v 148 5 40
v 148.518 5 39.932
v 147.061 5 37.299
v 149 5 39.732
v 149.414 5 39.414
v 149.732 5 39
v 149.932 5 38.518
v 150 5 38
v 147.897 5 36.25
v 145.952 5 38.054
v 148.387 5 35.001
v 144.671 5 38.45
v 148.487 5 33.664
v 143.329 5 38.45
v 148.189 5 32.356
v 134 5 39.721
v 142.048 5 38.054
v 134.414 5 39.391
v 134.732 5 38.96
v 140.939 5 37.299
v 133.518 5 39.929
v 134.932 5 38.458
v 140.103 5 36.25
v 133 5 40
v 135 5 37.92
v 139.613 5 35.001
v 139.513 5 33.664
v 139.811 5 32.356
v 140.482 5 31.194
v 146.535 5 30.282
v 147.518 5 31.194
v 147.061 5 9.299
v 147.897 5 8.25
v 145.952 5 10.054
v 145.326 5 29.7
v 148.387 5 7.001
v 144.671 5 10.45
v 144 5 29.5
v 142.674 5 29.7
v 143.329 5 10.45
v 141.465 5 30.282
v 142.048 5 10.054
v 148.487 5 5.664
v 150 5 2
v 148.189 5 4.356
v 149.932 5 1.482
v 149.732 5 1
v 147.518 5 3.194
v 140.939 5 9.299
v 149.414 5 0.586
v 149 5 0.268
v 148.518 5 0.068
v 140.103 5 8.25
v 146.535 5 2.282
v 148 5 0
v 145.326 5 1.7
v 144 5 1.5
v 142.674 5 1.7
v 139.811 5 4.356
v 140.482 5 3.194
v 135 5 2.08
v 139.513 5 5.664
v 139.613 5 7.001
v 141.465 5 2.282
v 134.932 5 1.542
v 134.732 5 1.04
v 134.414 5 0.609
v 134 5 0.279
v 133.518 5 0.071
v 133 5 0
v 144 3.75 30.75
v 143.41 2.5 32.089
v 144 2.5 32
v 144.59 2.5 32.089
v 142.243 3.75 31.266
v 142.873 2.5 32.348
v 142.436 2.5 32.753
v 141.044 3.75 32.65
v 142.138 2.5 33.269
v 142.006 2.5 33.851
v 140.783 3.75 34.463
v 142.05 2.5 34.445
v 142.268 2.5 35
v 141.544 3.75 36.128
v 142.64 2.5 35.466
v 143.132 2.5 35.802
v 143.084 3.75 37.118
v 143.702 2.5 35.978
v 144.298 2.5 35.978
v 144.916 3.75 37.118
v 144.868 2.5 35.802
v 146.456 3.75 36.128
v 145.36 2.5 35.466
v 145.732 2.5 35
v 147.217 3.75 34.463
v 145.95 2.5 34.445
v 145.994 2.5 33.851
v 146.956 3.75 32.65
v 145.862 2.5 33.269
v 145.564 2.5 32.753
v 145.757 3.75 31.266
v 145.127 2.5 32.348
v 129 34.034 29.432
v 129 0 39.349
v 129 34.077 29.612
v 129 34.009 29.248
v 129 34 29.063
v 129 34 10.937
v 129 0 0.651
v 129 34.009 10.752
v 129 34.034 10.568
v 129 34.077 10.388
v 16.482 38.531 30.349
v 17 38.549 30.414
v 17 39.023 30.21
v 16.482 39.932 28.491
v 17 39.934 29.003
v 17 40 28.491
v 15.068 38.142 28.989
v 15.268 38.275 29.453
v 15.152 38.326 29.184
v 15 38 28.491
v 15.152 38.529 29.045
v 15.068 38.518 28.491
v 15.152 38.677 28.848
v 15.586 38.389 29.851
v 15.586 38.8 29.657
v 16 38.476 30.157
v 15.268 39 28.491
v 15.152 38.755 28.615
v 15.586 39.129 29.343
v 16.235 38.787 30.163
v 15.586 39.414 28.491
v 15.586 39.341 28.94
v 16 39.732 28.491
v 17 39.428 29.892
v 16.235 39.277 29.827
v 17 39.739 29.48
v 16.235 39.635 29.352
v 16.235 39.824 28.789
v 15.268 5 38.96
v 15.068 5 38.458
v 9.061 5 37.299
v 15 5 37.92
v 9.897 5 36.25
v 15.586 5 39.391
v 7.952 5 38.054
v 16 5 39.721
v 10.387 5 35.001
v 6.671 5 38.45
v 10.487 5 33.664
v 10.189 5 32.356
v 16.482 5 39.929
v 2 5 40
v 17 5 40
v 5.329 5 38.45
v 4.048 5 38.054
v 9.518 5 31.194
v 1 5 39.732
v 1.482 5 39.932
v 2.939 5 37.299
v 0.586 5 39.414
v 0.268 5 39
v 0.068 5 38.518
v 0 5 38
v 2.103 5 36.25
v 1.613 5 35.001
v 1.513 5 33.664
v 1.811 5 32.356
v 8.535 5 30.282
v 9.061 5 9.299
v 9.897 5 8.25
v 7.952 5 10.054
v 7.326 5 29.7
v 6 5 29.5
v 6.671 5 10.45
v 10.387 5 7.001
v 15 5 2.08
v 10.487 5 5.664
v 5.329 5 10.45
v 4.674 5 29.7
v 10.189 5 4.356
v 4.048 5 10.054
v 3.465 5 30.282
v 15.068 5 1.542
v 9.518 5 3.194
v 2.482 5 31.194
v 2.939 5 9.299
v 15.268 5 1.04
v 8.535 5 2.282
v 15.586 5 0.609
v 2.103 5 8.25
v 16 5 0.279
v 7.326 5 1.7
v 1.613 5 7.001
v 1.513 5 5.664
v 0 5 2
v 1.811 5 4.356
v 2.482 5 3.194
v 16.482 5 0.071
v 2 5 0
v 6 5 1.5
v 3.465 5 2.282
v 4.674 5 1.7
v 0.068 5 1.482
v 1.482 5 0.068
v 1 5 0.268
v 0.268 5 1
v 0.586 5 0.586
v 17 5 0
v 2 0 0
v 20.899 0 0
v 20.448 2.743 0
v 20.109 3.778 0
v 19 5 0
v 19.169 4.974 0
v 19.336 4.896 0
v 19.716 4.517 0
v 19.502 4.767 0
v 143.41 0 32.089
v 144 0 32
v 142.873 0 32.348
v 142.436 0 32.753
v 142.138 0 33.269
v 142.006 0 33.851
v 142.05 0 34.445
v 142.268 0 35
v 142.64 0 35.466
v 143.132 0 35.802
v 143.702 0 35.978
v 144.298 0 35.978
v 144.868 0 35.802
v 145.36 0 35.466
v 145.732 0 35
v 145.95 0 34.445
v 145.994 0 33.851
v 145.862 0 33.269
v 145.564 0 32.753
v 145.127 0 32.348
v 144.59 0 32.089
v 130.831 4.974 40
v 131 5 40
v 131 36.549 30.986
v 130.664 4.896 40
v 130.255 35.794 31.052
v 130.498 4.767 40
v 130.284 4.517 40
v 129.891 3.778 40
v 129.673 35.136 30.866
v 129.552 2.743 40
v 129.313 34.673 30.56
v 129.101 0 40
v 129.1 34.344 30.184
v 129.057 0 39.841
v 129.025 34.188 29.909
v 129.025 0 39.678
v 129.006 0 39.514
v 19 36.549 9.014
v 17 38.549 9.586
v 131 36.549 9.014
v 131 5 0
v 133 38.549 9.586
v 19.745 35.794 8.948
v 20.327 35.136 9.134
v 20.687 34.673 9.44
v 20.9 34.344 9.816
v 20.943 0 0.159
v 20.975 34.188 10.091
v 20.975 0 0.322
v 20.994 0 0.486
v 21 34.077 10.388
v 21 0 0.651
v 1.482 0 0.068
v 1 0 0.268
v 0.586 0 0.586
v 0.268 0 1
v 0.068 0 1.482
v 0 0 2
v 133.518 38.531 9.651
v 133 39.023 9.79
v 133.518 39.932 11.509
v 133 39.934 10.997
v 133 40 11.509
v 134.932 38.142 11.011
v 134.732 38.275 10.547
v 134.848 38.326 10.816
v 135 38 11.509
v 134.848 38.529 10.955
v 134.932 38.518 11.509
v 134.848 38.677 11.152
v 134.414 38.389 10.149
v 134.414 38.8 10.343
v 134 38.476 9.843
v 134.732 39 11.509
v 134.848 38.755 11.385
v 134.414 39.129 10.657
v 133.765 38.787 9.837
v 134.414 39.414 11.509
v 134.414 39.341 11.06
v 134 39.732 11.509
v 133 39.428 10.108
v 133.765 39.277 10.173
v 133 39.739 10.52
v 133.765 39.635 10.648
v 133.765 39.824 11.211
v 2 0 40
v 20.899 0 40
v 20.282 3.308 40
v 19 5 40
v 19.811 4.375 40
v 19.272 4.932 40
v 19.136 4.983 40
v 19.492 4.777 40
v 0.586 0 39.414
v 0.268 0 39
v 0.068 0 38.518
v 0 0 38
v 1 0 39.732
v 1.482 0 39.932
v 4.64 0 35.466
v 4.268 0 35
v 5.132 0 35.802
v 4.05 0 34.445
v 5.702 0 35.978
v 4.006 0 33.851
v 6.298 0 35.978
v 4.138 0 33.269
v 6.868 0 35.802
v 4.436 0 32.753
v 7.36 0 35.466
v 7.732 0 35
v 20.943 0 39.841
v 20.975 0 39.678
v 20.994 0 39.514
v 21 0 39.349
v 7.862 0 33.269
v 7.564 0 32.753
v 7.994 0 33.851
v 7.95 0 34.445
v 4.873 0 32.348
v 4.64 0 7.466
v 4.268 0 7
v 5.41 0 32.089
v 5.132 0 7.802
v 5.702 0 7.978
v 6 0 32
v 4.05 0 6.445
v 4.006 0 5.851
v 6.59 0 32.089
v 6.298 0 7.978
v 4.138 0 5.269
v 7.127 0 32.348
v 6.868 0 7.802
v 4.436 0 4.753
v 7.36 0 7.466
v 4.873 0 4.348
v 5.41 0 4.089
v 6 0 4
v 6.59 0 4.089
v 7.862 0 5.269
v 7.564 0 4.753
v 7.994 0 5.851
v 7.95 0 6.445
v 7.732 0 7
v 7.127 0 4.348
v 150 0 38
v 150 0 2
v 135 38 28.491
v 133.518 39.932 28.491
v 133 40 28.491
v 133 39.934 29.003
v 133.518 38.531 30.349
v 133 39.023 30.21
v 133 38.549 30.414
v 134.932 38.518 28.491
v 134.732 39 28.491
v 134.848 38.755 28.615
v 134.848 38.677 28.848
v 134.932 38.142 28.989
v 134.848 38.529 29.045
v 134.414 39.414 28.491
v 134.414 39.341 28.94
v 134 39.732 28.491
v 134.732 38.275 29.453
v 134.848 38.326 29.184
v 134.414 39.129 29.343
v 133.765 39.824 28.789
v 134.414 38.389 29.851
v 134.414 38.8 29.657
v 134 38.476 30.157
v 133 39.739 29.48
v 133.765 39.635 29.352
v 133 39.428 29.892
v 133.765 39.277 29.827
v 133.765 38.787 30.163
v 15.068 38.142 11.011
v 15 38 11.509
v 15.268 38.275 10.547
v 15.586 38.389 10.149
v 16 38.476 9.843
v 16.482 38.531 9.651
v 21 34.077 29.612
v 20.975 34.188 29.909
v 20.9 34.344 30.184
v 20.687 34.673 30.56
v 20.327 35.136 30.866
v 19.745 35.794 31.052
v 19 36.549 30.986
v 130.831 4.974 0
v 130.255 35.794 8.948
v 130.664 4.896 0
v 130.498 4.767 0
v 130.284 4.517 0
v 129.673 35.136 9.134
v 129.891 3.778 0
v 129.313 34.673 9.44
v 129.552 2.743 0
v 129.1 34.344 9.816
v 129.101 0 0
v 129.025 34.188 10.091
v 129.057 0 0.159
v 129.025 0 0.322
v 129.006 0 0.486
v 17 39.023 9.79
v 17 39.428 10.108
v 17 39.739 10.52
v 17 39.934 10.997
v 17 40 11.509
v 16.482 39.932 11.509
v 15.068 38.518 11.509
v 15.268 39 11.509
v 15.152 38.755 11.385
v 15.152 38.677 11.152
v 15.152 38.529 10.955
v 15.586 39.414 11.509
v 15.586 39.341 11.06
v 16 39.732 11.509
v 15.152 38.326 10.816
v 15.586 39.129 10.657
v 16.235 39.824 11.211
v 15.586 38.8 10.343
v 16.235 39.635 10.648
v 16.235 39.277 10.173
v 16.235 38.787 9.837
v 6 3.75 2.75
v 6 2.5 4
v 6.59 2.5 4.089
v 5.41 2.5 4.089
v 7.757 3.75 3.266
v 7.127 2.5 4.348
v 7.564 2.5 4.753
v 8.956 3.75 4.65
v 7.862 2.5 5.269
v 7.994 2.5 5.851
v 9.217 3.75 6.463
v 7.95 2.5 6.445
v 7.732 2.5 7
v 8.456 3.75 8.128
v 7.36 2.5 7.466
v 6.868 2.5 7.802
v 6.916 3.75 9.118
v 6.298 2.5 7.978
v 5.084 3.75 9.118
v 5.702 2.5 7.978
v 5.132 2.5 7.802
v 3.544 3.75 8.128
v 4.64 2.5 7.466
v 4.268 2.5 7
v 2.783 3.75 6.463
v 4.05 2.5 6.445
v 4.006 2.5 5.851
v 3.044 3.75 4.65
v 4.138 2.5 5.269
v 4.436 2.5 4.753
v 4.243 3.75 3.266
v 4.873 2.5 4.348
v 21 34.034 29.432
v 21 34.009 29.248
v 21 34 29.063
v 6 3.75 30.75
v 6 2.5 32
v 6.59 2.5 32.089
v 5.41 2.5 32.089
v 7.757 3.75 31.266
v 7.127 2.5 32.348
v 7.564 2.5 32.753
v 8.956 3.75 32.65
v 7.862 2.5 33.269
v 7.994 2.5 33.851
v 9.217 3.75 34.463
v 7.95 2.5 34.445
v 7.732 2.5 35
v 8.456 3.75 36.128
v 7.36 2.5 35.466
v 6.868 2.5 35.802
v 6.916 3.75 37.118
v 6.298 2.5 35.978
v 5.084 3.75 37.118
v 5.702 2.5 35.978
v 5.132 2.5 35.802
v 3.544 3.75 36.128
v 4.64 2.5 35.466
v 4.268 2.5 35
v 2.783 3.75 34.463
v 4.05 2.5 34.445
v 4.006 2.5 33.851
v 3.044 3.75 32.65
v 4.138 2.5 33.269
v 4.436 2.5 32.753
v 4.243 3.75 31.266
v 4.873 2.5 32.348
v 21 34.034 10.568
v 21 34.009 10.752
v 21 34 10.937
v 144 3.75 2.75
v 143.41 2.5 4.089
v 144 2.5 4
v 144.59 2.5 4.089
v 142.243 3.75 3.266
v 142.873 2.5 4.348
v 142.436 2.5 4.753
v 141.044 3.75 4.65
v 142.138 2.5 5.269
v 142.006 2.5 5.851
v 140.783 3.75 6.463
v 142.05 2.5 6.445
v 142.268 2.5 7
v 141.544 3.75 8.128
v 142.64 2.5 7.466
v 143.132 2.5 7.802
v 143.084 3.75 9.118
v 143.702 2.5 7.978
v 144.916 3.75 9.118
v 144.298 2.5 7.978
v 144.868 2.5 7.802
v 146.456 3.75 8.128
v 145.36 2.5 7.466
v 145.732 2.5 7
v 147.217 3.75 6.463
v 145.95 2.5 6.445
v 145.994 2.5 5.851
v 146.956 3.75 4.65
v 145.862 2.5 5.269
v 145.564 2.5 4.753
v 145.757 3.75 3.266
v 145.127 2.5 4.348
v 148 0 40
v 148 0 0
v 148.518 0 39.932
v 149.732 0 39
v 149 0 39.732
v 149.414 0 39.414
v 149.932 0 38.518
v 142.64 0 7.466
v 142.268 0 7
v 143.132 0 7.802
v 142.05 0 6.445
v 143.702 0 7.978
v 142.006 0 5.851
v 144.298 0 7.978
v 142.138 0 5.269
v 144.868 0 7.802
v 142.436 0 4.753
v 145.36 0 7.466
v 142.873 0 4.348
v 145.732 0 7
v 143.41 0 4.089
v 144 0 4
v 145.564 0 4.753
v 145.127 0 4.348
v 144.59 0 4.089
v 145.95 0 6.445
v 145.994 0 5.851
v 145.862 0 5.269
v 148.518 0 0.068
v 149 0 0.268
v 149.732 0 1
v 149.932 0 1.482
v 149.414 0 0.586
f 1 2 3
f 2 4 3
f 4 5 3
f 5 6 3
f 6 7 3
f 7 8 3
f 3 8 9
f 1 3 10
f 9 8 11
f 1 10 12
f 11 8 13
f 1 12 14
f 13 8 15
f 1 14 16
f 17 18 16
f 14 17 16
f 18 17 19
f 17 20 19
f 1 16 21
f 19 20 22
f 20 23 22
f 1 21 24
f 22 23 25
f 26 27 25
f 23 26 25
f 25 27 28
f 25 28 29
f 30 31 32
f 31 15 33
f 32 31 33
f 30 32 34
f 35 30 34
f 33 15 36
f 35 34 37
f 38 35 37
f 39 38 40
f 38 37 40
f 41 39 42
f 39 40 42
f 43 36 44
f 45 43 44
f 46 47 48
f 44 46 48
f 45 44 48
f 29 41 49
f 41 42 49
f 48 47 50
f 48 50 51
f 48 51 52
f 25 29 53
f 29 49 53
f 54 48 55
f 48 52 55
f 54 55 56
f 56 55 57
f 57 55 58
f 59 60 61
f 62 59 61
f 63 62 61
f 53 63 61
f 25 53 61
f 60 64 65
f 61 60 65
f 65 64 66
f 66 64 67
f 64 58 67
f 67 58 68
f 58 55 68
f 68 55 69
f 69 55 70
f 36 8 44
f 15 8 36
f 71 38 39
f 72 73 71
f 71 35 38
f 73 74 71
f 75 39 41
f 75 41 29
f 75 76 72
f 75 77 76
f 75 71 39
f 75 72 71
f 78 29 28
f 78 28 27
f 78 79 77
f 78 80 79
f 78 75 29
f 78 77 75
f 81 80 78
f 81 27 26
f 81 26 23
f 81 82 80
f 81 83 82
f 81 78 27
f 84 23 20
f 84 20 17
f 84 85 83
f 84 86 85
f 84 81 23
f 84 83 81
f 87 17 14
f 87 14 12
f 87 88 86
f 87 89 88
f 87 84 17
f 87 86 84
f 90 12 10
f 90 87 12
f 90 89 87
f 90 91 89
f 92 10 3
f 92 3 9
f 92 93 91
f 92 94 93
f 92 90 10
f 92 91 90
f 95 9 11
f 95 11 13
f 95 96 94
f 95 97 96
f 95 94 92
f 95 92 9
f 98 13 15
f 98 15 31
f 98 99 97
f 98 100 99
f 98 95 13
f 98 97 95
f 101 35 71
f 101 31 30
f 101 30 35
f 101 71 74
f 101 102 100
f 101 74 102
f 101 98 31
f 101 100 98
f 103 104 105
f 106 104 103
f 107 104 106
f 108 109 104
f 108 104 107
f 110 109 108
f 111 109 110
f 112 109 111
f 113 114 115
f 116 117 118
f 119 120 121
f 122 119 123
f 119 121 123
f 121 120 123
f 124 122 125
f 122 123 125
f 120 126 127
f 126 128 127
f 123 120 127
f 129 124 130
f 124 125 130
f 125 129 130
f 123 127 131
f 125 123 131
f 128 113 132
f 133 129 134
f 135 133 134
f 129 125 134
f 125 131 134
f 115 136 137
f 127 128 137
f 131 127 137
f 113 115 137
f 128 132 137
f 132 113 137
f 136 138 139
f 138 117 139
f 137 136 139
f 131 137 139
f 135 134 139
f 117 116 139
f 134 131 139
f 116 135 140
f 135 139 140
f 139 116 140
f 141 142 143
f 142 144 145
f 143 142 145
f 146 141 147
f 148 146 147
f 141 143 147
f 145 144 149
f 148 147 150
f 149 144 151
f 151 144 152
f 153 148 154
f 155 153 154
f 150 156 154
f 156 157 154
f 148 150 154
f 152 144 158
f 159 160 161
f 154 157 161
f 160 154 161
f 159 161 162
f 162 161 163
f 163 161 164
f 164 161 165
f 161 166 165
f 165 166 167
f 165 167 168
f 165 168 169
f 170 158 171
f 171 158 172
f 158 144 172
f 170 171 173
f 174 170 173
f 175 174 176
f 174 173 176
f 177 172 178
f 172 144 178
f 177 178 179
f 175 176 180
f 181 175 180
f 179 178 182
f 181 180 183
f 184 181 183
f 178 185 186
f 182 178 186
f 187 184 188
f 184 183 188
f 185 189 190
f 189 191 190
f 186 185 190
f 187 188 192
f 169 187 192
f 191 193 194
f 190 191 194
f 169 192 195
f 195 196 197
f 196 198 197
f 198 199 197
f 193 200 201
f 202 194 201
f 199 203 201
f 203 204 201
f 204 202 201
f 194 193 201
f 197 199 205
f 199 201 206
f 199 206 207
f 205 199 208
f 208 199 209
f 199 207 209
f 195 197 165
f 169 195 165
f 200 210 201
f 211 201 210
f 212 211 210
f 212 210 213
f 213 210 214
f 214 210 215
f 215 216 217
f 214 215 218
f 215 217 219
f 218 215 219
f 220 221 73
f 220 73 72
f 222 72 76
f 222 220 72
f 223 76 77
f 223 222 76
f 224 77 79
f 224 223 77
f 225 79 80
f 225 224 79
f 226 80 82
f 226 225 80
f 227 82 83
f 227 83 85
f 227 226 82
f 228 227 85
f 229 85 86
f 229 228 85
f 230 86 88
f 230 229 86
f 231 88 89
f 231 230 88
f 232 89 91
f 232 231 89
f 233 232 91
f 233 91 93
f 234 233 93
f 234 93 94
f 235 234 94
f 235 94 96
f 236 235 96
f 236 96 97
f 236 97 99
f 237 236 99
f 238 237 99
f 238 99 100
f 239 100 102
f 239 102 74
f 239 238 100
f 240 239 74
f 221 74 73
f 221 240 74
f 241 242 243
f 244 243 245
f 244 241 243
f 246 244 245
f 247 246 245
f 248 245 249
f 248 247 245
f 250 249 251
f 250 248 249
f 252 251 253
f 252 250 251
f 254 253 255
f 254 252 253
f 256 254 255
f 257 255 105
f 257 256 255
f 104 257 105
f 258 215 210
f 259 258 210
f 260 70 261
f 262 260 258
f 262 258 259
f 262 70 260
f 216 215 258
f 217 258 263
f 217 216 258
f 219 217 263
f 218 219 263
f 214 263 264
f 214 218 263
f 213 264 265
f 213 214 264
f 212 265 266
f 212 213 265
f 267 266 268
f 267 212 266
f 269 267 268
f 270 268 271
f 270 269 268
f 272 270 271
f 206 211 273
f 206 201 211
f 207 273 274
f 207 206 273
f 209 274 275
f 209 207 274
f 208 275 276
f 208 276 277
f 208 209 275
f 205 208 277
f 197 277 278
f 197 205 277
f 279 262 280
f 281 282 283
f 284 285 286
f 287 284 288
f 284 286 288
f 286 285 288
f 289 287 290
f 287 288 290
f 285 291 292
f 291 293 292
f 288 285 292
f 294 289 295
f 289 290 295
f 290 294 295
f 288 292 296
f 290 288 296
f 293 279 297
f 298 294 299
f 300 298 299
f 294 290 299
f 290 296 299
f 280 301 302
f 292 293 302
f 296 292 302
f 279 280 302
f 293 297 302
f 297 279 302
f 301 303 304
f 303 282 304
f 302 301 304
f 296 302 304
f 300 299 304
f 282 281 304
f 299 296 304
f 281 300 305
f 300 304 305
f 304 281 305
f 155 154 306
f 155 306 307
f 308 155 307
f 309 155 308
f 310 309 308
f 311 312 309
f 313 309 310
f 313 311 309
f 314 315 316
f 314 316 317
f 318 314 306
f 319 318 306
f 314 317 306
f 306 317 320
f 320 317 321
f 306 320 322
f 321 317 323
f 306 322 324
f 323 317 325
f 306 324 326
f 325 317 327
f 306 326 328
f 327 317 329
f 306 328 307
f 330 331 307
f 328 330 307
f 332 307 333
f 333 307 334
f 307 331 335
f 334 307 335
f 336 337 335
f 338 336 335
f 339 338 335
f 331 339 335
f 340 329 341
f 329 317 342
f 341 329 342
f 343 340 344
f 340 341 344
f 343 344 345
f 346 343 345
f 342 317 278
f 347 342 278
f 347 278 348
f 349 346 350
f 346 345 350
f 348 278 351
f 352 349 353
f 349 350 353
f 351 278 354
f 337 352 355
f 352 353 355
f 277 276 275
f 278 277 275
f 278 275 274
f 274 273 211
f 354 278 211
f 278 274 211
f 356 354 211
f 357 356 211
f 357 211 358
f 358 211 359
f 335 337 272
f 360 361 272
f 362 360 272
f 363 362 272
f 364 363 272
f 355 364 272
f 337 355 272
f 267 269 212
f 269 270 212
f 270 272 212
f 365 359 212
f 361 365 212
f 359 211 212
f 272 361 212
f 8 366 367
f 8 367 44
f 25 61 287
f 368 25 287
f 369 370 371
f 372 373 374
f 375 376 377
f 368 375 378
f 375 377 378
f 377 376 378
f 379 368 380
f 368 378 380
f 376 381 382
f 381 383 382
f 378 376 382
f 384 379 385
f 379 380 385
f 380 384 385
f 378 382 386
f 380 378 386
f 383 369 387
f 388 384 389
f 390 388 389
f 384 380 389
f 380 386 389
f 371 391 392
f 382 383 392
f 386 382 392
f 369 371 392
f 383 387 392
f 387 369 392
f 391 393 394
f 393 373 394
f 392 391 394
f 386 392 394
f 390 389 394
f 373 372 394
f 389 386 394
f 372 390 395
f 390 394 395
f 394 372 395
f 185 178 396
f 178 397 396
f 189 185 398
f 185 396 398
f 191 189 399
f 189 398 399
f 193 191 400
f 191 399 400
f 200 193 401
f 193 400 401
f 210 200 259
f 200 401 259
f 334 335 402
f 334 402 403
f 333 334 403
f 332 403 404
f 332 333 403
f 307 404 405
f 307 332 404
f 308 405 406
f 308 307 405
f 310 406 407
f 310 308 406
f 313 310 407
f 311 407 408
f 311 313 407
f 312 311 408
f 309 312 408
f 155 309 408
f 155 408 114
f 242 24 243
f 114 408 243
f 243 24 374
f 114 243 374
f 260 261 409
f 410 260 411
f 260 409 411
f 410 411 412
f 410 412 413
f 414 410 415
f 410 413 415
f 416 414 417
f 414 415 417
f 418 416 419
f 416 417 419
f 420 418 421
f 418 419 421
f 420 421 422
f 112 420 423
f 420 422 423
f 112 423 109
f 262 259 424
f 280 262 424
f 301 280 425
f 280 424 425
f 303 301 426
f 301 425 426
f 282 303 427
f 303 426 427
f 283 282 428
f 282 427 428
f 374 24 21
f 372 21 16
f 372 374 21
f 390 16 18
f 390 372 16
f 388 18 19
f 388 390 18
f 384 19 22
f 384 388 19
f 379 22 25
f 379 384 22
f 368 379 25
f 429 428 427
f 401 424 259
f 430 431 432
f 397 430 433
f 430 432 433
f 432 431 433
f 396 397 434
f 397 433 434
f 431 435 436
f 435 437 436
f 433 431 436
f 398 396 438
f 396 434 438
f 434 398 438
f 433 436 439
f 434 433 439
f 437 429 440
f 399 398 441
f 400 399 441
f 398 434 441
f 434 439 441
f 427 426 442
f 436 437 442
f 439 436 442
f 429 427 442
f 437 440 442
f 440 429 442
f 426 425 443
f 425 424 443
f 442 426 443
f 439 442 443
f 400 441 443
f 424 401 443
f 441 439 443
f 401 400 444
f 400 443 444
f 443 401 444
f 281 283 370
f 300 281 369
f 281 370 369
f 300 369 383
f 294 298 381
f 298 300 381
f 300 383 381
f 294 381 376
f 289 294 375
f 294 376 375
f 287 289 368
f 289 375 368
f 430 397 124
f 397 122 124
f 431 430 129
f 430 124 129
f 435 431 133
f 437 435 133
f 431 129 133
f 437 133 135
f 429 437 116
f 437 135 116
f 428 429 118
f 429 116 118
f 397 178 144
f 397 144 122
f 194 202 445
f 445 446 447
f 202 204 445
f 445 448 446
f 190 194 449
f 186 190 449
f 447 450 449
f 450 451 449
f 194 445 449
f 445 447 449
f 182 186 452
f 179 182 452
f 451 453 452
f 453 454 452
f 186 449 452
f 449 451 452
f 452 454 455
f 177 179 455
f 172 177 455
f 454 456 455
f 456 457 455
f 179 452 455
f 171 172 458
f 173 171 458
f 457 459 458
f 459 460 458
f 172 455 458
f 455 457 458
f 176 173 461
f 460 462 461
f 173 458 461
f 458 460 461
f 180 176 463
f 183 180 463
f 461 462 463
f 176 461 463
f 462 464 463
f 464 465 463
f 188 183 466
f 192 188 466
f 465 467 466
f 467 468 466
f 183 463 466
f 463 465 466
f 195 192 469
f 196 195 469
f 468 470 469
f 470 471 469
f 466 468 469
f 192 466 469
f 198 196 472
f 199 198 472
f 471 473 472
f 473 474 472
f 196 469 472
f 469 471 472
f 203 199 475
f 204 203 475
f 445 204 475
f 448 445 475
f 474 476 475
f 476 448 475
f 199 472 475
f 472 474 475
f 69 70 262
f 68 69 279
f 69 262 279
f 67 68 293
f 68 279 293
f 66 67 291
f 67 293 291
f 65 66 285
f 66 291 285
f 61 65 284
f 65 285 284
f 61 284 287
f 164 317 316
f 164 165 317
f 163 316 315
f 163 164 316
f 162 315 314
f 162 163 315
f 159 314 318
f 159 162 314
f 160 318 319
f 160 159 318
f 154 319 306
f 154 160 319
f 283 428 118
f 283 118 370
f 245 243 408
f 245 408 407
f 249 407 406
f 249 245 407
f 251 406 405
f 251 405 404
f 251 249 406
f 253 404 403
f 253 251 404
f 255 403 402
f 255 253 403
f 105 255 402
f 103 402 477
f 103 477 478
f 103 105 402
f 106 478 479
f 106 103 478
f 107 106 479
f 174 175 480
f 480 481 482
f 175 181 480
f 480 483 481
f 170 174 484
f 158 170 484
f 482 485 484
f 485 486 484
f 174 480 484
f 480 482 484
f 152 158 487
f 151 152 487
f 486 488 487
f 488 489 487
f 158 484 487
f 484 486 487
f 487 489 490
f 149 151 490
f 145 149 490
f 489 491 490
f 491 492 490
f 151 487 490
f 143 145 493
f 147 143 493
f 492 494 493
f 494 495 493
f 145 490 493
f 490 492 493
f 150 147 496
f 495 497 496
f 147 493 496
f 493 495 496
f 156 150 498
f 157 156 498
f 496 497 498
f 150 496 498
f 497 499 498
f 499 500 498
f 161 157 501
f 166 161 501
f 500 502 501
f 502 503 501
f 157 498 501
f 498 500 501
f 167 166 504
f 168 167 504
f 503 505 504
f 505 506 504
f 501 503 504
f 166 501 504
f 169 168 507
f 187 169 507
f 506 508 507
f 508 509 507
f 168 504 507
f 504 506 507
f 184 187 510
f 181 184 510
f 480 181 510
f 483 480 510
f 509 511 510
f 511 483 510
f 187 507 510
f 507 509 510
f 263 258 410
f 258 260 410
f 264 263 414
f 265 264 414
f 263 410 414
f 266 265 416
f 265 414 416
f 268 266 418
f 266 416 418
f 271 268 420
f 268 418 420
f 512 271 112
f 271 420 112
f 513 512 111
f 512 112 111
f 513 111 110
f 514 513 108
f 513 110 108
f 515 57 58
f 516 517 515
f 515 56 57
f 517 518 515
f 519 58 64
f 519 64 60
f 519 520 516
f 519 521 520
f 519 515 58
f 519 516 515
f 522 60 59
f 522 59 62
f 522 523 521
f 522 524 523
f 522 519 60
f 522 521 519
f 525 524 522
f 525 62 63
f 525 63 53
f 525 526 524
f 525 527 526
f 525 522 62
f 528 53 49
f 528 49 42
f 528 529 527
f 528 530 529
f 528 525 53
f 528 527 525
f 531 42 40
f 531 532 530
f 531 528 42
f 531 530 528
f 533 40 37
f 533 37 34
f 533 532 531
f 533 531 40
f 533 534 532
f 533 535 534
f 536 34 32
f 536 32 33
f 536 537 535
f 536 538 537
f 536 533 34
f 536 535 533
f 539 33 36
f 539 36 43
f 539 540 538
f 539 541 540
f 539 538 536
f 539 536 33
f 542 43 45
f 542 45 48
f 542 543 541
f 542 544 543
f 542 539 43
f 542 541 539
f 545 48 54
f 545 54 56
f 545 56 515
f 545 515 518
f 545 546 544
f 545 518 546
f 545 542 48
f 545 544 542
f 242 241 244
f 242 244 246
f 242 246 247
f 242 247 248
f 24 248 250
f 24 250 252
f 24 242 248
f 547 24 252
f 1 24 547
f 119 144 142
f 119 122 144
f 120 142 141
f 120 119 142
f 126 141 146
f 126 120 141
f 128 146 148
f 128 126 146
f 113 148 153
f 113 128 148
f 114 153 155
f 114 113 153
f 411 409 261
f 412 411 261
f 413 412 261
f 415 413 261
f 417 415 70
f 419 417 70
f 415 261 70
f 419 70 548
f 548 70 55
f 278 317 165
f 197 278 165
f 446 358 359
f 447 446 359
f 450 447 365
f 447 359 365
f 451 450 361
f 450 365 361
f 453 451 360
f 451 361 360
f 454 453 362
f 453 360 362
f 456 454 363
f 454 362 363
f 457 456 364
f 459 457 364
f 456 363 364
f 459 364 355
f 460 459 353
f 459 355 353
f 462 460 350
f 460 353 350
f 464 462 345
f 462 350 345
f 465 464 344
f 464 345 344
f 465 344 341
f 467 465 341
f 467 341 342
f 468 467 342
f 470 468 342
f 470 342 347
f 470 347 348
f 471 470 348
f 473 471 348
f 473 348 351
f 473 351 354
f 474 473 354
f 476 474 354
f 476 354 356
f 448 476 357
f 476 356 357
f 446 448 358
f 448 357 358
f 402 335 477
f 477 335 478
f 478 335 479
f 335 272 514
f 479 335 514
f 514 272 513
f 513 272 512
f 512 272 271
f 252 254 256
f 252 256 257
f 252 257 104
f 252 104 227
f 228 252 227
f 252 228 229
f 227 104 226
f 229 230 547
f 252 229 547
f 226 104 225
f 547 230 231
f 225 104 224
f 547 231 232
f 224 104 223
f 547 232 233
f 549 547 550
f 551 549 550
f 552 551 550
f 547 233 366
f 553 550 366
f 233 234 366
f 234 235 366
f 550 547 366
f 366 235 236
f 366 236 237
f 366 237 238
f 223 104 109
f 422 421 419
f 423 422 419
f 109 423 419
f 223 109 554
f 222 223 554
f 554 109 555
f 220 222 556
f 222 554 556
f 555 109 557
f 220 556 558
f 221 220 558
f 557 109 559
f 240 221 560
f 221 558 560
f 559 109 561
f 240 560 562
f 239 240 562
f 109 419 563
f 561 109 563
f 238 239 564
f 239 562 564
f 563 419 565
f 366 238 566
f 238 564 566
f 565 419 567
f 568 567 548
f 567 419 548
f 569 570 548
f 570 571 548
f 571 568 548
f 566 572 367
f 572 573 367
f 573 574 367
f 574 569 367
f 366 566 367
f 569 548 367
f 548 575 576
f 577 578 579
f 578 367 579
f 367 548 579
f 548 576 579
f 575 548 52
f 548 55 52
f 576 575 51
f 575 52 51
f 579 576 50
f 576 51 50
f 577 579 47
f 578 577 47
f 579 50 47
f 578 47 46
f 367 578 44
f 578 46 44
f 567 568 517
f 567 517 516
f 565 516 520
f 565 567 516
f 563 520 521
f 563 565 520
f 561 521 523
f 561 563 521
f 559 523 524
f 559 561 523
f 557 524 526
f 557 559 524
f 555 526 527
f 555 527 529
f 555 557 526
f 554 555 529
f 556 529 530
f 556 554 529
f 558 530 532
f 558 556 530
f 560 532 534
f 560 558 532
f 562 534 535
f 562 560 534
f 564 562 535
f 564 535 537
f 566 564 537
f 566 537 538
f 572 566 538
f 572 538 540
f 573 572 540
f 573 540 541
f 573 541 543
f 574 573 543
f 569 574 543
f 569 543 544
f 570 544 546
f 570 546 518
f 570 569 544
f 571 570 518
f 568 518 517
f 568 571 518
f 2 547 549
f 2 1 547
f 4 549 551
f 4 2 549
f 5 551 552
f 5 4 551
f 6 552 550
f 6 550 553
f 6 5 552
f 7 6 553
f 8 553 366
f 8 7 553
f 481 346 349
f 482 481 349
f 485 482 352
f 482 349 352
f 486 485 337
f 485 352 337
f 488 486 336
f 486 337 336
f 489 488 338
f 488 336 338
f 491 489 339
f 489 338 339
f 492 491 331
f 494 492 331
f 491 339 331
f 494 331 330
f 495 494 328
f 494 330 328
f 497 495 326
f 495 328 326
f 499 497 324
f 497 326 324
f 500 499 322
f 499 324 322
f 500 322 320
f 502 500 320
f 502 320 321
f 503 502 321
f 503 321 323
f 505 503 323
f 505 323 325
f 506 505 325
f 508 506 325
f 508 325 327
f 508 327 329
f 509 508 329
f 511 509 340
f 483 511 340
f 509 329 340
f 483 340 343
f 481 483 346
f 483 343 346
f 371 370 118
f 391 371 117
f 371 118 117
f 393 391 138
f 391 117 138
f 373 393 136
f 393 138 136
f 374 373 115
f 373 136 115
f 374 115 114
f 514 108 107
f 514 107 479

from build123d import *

# Parameters (mm, degrees)
SKETCH_1_W          = 150
SKETCH_1_H          = 40
EXTRUDE_1_DEPTH     = 40
CUT_EXTRUDE_1_REACH = 162.312
SKETCH_2_W          = 15
SKETCH_2_H          = 35
CUT_EXTRUDE_2_REACH = 162.312
SKETCH_3_W          = 108
SKETCH_3_H          = 34
CUT_EXTRUDE_3_REACH = 148.373
SKETCH_5_R          = 2
CUT_EXTRUDE_4_DEPTH = 5
CHAMFER_1_SIZE      = 2.5
FILLET_2_R          = 2
FILLET_3_R          = 2


with BuildPart() as part:
    # 草图1 → 凸台-拉伸1 (new body)
    with BuildSketch(Plane.XY):
        with Locations((75, 20)):
            Rectangle(SKETCH_1_W, SKETCH_1_H)
    extrude(amount=EXTRUDE_1_DEPTH)

    # 草图2 → 切除-拉伸1 (cut, up to next)
    with BuildSketch(Plane(origin=(0, 0, 0), x_dir=(-1, 0, 0), z_dir=(0, 0, -1)), mode=Mode.PRIVATE) as cut_extrude_1_sk1:
        with Locations((-142.5, 22.5)):
            Rectangle(SKETCH_2_W, SKETCH_2_H)
    cut_extrude_1_tool1 = extrude(cut_extrude_1_sk1.sketch, amount=-CUT_EXTRUDE_1_REACH, mode=Mode.PRIVATE) & part.part
    # 草图2 → 切除-拉伸1 (cut, up to next)
    with BuildSketch(Plane(origin=(0, 0, 0), x_dir=(-1, 0, 0), z_dir=(0, 0, -1)), mode=Mode.PRIVATE) as cut_extrude_1_sk2:
        with Locations((-7.5, 22.5)):
            Rectangle(SKETCH_2_W, SKETCH_2_H)
    cut_extrude_1_tool2 = extrude(cut_extrude_1_sk2.sketch, amount=-CUT_EXTRUDE_1_REACH, mode=Mode.PRIVATE) & part.part
    add(cut_extrude_1_tool1.solids().sort_by_distance((142.5, 22.5, 0))[0], mode=Mode.SUBTRACT)
    add(cut_extrude_1_tool2.solids().sort_by_distance((7.5, 22.5, 0))[0], mode=Mode.SUBTRACT)

    # 草图3 → 切除-拉伸2 (cut, up to next)
    with BuildSketch(Plane(origin=(0, 0, 0), x_dir=(-1, 0, 0), z_dir=(0, 0, -1)), mode=Mode.PRIVATE) as cut_extrude_2_sk1:
        with Locations((-75, 17)):
            Rectangle(SKETCH_3_W, SKETCH_3_H)
    cut_extrude_2_tool1 = extrude(cut_extrude_2_sk1.sketch, amount=-CUT_EXTRUDE_2_REACH, mode=Mode.PRIVATE) & part.part
    add(cut_extrude_2_tool1.solids().sort_by_distance((75, 17, 0))[0], mode=Mode.SUBTRACT)

    # 切除-拉伸3: up to this face of the body (flat: up to its plane)
    cut_extrude_3_end = Plane(part.part.faces().sort_by_distance((15, 22.5, 20))[0])
    # 草图4 → 切除-拉伸3 (cut, up to the picked face)
    with BuildSketch(Plane(origin=(135, 0, 0), x_dir=(0, 0, -1), z_dir=(1, 0, 0)), mode=Mode.PRIVATE) as cut_extrude_3_sk1:
        Polygon((-40, 40), (-40, 5), (-30, 40), align=None)
    cut_extrude_3_tool1 = split(extrude(cut_extrude_3_sk1.sketch, amount=-CUT_EXTRUDE_3_REACH, mode=Mode.PRIVATE), bisect_by=cut_extrude_3_end, keep=Keep.BOTH, mode=Mode.PRIVATE)
    # 草图4 → 切除-拉伸3 (cut, up to the picked face)
    with BuildSketch(Plane(origin=(135, 0, 0), x_dir=(0, 0, -1), z_dir=(1, 0, 0)), mode=Mode.PRIVATE) as cut_extrude_3_sk2:
        Polygon((-10, 40), (0, 40), (0, 5), align=None)
    cut_extrude_3_tool2 = split(extrude(cut_extrude_3_sk2.sketch, amount=-CUT_EXTRUDE_3_REACH, mode=Mode.PRIVATE), bisect_by=cut_extrude_3_end, keep=Keep.BOTH, mode=Mode.PRIVATE)
    add(cut_extrude_3_tool1.solids().sort_by(Axis((135, 28.333333, 36.666667), (-1, 0, 0)))[0], mode=Mode.SUBTRACT)
    add(cut_extrude_3_tool2.solids().sort_by(Axis((135, 28.333333, 3.333333), (-1, 0, 0)))[0], mode=Mode.SUBTRACT)

    # 草图5 → 切除-拉伸4 (cut)
    with BuildSketch(Plane.XZ):
        with Locations(Location((6, 6, 0), (0, 0, 270))):
            Circle(SKETCH_5_R)
        with Locations(Location((6, 34, 0), (0, 0, 270))):
            Circle(SKETCH_5_R)
    cut_extrude_4 = extrude(amount=-CUT_EXTRUDE_4_DEPTH, mode=Mode.SUBTRACT)

    # 镜向5: 切除-拉伸4 across plane
    add(cut_extrude_4.mirror(Plane.ZY.offset(-75)), mode=Mode.SUBTRACT)

    # 倒角1
    chamfer_1_edges = [part.edges().sort_by_distance(p)[0] for p in [
        (144, 5, 36),
        (6, 5, 8),
        (6, 5, 36),
        (144, 5, 8),
    ]]
    chamfer(chamfer_1_edges, length=CHAMFER_1_SIZE)

    # 圆角2
    fillet_2_edges = [part.edges().sort_by_distance(p)[0] for p in [
        (135, 22.5, 5),
        (135, 40, 20),
        (135, 22.5, 35),
        (15, 22.5, 35),
        (15, 40, 20),
        (15, 22.5, 5),
        (75, 40, 10),
        (75, 40, 30),
        (21, 19.5, 4.142857143),
        (75, 34, 8.285714286),
        (129, 19.5, 4.142857143),
        (129, 19.5, 35.857142857),
        (21, 19.5, 35.857142857),
        (75, 34, 31.714285714),
    ]]
    fillet(fillet_2_edges, radius=FILLET_2_R)

    # 圆角3
    fillet_3_edges = [part.edges().sort_by_distance(p)[0] for p in [
        (150, 2.5, 40),
        (0, 2.5, 0),
        (0, 2.5, 40),
        (150, 2.5, 0),
    ]]
    fillet(fillet_3_edges, radius=FILLET_3_R)


solid = part.part
